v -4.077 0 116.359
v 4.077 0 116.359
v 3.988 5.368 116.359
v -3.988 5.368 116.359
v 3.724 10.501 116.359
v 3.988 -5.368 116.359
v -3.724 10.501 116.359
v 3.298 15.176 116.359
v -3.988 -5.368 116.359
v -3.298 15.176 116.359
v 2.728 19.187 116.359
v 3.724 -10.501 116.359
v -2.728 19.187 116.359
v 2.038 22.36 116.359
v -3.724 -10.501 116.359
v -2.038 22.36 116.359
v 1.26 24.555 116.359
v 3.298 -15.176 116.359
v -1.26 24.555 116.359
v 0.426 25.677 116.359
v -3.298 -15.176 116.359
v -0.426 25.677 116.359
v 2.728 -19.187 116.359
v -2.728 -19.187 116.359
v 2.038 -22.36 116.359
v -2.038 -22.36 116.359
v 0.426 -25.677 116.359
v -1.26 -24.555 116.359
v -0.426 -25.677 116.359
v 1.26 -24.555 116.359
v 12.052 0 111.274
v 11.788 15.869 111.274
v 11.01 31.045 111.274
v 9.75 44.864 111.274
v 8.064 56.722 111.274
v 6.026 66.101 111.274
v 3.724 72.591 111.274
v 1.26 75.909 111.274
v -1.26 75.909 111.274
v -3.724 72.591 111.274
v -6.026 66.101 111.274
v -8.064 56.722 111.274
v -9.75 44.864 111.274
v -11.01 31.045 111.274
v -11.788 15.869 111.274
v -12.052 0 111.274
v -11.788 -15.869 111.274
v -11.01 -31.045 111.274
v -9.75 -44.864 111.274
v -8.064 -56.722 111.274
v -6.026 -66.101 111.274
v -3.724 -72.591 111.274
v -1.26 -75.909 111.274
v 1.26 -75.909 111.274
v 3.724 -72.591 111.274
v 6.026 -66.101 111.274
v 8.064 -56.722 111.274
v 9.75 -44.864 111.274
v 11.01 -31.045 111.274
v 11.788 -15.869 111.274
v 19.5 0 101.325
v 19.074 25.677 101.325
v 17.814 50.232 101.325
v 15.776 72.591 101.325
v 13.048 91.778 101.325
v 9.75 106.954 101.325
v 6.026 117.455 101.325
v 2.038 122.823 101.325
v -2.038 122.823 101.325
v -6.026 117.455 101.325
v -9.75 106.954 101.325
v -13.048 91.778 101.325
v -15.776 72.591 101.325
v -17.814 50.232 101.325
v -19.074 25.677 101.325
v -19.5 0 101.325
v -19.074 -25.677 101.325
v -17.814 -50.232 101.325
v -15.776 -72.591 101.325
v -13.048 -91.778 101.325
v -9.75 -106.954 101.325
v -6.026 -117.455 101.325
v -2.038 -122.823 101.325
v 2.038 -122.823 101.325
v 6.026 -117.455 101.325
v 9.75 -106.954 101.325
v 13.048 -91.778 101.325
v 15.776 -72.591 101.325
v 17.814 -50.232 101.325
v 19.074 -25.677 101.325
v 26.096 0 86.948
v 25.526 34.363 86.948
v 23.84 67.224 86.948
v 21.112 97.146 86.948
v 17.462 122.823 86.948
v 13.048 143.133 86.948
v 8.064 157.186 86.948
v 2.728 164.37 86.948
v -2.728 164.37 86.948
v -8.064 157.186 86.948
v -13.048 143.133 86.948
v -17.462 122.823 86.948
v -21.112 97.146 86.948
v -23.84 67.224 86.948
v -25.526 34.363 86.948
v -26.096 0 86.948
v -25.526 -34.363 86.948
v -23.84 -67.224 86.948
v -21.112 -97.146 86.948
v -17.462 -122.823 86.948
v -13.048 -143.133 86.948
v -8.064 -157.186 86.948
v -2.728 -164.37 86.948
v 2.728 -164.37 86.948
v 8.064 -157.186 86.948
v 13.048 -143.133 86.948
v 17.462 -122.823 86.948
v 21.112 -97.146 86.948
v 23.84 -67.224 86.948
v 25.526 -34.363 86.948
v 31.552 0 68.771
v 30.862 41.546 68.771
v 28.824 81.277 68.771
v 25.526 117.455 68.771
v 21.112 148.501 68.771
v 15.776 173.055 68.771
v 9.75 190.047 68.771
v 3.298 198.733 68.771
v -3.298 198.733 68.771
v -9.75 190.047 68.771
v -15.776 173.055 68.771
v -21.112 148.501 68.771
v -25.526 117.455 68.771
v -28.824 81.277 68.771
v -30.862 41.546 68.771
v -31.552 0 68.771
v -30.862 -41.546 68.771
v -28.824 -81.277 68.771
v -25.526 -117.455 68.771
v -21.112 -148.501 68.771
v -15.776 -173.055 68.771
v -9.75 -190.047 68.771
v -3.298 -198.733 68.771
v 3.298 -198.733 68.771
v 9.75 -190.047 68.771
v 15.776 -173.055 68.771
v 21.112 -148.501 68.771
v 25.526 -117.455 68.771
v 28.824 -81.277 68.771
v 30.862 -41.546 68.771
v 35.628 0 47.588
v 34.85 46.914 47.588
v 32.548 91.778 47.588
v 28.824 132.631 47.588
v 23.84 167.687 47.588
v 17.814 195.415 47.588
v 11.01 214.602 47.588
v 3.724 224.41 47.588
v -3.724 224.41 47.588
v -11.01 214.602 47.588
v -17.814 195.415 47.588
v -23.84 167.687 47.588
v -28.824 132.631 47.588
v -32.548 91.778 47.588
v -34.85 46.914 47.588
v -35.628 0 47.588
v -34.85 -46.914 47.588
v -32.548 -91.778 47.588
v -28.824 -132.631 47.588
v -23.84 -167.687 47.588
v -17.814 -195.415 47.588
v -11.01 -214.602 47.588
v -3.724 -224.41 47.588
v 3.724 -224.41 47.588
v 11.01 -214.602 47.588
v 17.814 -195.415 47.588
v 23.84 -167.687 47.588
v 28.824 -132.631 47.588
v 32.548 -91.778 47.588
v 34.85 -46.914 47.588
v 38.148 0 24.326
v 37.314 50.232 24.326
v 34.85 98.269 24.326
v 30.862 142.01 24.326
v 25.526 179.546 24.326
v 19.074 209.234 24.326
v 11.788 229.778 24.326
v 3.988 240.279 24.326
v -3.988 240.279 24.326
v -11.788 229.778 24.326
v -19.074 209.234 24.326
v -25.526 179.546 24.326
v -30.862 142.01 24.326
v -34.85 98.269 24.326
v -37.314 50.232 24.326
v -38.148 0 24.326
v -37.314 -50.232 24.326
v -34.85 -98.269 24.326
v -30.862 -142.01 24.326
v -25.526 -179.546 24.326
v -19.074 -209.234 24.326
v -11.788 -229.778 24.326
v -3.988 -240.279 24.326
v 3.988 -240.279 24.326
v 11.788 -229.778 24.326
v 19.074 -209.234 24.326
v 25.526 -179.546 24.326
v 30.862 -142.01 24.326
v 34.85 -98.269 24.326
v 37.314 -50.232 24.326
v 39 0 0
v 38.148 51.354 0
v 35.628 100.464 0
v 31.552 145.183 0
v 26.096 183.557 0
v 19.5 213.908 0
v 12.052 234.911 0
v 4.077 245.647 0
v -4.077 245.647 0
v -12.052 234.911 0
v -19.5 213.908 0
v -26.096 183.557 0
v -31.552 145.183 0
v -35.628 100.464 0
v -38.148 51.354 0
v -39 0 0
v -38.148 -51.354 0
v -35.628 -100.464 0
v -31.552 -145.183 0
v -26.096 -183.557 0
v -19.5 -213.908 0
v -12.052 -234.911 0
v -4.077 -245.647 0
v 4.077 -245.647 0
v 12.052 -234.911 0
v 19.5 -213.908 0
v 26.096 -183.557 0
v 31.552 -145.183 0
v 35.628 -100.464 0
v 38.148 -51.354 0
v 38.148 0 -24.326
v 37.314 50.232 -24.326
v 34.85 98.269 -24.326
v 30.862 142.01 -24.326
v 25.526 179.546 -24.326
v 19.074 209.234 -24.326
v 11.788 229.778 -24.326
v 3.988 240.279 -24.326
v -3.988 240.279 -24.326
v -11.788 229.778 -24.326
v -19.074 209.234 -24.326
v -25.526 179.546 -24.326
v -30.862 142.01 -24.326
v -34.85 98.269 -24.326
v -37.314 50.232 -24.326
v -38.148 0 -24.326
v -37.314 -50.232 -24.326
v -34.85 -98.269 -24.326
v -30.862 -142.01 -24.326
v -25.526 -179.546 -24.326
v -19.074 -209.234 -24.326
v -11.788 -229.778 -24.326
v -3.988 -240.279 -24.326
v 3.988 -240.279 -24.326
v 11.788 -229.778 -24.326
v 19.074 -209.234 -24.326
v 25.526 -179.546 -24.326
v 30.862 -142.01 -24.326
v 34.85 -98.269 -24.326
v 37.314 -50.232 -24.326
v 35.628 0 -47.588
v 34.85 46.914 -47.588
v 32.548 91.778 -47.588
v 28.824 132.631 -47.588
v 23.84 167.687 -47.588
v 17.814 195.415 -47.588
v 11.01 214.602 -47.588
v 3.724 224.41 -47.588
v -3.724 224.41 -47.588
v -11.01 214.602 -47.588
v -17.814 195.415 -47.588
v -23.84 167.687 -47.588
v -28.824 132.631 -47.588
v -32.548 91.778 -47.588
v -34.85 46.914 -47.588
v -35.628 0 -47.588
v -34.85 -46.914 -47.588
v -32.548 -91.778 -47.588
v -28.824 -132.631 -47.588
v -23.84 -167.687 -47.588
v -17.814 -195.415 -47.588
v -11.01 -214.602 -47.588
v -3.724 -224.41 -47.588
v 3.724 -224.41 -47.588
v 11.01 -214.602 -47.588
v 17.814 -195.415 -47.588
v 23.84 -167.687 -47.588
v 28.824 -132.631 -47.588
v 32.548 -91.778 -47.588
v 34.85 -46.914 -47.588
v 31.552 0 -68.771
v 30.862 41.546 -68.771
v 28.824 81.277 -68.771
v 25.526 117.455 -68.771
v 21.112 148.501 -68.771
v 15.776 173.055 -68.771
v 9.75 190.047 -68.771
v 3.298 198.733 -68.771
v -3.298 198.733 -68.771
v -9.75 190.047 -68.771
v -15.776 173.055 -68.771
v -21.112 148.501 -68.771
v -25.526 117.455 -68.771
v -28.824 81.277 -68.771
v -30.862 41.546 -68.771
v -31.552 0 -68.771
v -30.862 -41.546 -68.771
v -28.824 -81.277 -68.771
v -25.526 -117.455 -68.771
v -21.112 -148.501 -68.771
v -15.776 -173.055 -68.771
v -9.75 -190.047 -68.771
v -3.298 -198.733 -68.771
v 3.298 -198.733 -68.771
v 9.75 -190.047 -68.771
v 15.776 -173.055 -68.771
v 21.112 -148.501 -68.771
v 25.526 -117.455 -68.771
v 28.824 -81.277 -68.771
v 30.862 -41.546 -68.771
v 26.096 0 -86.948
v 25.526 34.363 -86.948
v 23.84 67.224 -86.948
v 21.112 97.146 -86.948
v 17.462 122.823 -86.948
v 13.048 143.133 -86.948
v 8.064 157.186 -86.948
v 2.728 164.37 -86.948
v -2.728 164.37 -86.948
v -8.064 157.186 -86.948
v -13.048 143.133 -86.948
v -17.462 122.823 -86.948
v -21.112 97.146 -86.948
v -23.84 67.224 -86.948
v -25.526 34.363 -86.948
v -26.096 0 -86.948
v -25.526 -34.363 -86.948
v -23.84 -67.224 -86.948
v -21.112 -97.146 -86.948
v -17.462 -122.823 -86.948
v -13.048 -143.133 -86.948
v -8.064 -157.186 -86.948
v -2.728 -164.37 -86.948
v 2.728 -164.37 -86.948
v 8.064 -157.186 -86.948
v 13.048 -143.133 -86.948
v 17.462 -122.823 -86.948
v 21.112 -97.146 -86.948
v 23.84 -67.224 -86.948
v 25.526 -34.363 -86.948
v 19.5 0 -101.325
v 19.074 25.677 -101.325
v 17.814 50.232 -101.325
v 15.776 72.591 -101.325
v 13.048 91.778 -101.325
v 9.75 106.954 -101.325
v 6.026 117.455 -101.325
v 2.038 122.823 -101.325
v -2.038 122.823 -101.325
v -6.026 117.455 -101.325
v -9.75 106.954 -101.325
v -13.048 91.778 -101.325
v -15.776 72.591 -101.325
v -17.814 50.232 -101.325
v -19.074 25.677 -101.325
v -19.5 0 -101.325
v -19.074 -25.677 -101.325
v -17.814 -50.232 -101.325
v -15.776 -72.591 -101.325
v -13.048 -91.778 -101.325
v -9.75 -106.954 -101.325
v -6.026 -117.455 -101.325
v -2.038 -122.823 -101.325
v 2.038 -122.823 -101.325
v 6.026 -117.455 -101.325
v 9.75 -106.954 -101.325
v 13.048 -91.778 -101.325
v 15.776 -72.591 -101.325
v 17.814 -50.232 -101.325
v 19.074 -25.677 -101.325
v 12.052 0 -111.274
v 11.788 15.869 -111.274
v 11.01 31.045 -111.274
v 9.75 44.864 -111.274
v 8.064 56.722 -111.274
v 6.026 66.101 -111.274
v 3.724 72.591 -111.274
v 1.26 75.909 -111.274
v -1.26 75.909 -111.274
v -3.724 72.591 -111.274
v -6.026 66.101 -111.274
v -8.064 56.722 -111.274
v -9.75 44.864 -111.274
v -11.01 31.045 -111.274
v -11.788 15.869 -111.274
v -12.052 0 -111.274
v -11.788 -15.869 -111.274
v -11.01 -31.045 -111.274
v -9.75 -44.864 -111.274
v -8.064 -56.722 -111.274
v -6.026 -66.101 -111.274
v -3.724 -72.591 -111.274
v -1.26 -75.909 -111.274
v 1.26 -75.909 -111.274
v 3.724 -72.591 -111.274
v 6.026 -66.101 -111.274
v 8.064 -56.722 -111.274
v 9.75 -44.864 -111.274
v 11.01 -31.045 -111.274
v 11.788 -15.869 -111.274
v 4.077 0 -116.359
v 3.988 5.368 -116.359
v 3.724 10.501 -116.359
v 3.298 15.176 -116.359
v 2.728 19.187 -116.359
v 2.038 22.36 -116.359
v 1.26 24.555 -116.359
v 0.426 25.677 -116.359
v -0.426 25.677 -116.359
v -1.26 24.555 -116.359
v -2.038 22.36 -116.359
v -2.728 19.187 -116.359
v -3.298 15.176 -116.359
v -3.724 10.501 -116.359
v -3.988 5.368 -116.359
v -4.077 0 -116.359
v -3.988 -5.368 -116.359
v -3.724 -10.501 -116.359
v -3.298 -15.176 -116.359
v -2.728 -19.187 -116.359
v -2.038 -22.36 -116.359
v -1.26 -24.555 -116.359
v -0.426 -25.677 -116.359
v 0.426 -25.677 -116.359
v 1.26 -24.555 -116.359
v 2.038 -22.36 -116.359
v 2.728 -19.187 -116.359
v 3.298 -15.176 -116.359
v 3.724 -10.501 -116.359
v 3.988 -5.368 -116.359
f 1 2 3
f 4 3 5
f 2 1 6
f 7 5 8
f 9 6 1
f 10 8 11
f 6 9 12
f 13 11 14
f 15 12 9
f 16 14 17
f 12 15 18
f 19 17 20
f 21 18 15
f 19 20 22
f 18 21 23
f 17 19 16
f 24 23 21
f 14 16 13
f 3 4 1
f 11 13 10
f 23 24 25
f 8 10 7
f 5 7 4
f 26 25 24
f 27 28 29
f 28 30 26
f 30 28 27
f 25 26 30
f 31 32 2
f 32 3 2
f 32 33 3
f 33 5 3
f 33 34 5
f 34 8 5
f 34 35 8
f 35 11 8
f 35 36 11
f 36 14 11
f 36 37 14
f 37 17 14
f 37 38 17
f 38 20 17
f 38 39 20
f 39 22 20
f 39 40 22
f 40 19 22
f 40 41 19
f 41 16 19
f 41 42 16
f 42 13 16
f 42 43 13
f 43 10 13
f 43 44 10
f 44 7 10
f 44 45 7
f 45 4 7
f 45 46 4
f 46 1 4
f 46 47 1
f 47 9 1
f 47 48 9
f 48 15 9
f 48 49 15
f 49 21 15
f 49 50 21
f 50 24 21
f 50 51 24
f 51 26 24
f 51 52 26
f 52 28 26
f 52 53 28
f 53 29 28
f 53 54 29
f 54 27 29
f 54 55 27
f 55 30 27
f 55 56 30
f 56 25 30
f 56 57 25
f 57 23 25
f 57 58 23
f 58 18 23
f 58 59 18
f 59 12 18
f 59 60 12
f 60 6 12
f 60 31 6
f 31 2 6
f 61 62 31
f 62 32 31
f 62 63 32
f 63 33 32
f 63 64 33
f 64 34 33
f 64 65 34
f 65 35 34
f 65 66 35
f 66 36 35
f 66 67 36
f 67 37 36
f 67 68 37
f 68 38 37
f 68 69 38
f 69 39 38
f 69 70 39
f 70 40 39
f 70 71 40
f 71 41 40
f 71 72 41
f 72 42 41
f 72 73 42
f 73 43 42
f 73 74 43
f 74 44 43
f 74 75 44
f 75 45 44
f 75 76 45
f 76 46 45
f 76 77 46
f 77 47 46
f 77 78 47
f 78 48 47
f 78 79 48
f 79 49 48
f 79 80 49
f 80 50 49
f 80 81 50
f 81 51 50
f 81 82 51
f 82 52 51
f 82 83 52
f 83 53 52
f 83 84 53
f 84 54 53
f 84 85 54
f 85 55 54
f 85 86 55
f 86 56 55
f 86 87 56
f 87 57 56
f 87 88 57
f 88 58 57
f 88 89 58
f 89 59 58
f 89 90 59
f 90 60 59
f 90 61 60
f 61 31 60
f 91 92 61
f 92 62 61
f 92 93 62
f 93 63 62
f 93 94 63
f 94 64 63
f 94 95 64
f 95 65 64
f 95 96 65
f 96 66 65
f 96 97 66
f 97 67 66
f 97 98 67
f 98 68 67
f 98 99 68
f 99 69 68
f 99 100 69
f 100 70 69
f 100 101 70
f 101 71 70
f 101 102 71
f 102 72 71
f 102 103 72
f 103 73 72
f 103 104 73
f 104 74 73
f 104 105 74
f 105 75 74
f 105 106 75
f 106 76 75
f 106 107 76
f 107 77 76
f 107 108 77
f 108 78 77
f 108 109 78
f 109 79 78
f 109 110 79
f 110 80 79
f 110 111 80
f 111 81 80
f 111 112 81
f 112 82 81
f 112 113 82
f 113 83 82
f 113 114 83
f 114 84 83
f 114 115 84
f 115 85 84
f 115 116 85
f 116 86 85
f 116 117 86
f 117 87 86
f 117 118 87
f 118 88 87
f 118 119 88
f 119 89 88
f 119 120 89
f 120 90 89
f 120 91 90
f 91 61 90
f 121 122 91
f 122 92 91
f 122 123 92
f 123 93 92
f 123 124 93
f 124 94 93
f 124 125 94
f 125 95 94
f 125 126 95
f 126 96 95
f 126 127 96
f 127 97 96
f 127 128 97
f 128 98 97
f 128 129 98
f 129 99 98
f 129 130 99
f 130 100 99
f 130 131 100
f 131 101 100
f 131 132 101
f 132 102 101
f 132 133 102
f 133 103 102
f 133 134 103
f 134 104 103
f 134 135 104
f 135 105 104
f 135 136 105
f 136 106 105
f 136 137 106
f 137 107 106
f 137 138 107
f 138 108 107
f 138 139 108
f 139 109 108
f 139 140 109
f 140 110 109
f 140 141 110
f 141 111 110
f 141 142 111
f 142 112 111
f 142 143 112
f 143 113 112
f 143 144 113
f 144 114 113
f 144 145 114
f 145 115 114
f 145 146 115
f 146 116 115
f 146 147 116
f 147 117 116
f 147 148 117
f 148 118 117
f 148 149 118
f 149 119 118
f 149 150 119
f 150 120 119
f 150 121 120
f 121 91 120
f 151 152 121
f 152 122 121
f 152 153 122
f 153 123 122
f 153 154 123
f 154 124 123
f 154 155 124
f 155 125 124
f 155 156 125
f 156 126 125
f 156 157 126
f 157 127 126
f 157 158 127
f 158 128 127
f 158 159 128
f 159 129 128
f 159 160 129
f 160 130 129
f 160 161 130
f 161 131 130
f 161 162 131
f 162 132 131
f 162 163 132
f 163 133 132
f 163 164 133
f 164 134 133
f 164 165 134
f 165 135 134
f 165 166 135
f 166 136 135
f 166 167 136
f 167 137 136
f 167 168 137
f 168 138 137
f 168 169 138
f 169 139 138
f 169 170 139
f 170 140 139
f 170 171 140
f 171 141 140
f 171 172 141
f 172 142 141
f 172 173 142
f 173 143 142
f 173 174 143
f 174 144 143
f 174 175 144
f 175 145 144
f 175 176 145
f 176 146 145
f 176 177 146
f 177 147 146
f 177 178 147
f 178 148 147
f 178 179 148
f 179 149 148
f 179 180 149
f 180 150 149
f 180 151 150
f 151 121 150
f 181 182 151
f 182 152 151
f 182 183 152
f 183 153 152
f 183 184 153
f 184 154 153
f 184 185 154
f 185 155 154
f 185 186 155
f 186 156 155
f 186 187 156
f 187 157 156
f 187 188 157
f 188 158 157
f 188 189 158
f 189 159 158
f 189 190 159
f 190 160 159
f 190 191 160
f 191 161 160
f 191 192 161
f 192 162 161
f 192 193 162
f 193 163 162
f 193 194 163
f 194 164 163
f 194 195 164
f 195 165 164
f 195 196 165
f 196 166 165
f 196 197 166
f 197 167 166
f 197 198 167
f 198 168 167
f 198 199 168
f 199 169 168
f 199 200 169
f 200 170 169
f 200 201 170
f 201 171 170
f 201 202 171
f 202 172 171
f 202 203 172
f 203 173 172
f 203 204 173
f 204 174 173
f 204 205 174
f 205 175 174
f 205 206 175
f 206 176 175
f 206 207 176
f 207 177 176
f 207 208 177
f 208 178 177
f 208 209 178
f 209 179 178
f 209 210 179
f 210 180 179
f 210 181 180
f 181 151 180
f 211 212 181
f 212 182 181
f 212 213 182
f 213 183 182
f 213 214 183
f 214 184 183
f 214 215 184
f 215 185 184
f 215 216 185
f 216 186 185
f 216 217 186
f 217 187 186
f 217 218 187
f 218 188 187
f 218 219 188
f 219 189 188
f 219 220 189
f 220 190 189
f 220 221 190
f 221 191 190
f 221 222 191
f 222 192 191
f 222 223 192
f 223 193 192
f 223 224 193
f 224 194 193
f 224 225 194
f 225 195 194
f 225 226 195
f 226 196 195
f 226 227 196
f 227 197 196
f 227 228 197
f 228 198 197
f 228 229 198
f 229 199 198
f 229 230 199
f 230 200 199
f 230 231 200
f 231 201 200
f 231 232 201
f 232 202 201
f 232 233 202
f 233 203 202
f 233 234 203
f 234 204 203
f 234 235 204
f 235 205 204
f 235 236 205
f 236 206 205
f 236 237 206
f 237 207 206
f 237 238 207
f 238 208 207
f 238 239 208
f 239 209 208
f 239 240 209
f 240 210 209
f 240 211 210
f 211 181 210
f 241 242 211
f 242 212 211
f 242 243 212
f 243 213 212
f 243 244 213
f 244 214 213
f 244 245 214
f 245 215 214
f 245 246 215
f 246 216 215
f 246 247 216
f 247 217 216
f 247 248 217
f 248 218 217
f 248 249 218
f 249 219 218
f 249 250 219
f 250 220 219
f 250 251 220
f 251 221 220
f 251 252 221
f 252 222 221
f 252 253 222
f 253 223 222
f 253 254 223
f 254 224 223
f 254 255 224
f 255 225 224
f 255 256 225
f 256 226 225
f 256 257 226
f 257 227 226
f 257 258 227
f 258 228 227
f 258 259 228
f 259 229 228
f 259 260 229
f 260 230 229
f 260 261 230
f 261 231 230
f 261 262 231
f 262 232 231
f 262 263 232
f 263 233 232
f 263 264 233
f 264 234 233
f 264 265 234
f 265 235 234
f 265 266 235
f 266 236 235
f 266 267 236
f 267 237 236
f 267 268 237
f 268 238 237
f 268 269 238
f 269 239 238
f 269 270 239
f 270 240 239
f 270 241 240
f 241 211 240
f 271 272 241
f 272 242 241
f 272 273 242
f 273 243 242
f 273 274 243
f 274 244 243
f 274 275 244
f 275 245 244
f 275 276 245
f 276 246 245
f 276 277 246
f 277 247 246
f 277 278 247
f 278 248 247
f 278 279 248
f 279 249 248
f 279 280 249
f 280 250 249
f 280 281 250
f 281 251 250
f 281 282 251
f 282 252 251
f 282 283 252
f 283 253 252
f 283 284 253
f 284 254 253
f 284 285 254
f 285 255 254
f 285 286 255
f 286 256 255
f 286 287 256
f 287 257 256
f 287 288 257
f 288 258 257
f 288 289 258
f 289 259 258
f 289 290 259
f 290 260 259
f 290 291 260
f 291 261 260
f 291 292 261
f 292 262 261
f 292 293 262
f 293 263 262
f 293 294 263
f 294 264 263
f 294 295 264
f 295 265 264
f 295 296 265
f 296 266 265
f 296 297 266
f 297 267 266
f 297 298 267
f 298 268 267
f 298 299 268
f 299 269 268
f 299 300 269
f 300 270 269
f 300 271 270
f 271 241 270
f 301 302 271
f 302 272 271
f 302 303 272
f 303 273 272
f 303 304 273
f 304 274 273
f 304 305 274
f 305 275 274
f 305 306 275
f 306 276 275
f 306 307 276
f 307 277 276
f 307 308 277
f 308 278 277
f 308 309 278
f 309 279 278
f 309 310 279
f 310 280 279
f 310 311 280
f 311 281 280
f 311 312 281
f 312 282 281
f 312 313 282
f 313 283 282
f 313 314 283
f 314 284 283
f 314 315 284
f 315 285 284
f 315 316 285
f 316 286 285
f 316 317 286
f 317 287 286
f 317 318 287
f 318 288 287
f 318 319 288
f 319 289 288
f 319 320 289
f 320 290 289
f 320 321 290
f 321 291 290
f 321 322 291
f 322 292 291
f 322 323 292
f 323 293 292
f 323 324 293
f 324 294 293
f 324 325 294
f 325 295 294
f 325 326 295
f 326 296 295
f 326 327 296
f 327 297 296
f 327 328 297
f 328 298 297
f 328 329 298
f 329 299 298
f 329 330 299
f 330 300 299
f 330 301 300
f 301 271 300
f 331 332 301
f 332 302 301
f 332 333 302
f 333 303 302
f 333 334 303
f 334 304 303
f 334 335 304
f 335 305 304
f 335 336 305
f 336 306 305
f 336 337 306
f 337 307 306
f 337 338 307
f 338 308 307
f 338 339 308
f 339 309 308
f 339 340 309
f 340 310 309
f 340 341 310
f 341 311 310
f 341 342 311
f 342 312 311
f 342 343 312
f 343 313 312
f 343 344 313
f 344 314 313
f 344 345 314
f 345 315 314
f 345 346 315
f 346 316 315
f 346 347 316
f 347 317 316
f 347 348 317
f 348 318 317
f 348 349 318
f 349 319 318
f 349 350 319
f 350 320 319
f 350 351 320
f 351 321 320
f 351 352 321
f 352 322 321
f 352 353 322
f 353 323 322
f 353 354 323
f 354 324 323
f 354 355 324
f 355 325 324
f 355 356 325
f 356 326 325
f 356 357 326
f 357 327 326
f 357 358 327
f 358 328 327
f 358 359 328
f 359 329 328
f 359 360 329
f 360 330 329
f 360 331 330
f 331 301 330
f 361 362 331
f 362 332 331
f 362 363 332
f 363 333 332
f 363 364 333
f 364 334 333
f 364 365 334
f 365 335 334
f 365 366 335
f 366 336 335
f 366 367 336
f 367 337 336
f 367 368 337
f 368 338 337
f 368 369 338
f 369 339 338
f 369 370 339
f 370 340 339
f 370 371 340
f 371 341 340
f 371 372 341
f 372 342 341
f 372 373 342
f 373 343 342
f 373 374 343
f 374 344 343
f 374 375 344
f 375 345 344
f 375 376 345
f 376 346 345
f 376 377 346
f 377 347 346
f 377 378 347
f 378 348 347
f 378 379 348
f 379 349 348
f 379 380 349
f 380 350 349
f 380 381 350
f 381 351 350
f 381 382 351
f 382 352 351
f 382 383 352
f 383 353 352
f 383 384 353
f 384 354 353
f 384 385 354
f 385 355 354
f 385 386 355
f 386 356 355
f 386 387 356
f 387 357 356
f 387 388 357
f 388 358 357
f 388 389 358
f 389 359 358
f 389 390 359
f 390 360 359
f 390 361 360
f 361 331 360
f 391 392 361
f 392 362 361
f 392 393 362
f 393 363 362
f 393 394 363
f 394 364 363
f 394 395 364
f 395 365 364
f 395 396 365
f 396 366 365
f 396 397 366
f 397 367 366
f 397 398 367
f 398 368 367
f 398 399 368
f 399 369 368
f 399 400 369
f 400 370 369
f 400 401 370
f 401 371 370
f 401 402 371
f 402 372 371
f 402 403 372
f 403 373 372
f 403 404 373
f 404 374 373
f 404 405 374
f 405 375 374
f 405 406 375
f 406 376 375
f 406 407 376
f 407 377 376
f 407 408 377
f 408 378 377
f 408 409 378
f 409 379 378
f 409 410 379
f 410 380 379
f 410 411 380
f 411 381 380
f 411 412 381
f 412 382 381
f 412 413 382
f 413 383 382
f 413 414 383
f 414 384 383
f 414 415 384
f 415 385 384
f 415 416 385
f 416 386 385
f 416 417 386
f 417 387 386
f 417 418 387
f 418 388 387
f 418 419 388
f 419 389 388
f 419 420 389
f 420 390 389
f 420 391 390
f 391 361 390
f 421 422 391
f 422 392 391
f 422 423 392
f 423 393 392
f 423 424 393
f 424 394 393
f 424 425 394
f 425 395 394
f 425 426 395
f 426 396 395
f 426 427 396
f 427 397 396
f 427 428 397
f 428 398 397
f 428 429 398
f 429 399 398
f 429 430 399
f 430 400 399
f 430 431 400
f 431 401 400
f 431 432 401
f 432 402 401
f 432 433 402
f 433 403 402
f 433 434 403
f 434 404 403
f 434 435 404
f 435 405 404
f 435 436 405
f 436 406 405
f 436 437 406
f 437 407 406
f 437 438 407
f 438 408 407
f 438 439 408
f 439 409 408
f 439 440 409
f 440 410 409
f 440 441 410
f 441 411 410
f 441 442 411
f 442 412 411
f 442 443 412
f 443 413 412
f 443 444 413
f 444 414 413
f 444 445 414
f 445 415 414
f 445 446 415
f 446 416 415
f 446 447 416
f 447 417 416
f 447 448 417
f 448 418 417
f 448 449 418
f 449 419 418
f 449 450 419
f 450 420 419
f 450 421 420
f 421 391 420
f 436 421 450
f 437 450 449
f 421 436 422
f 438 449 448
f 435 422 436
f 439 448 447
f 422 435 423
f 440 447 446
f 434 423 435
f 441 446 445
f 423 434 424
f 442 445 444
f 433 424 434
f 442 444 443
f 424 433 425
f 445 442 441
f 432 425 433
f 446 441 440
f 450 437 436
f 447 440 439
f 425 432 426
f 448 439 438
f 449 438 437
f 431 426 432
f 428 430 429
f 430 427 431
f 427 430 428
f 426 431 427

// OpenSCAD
// Generated by SolidPython 1.0.1 on 2020-07-29 00:46:46


scale(v = [3, 19, 9]) {
	sphere(r = 13);
}
/***********************************************
*********      SolidPython code:      **********
************************************************
 
# import packages: SolidPython
from solid import *
from solid.utils import *
from itertools import chain, combinations, permutations


class Resize:

    def __init__(self, scad_file):
        self.scad_file = scad_file
        #self.scad_file = import_scad(scad_file)
        # cone/cylinder param:
        self.r1 = 0
        self.r2 = 0
        self.h = 0
        # rectangular prism param:
        self.w = 0
        self.l = 0
        # ellipse param:
        self.r = 0

    # import OpenScad code (file name corresponds to shape)


    # classify shape + parameters
    def assign(self, param1, param2, param3):
        if self.scad_file == 'cone.scad':
            self.r1 = param1
            self.r2 = param2
            self.h = param3
        elif self.scad_file == 'cylinder.scad':
            self.r1 = param1
            self.r2 = param2
            self.h = param3
        elif self.scad_file == 'rectangularPrism.scad':
            self.h = param1
            self.l = param2
            self.w = param3
        else:
            self.r = param1
            self.h = param2

    # resize parameters
    def iterate(self):
        x = range(3, 20, 2)
        i = 1
        if self.scad_file == 'cone.scad':
            tempList = list(permutations(x, 2))
            for temp in tempList:
                param1 = temp[0]
                param2 = temp[1]
                filepath = 'produced_scad_files/' + 'cone' + str(param1) + '_' + str(param2) + '_' + '.scad'
                scad_render_to_file(cylinder(h=param1, r1=param2, r2=0), filepath)

        elif self.scad_file == 'cylinder.scad':
            tempList = list(permutations(x, 3))
            for temp in tempList:
                param1 = temp[0]
                param2 = temp[1]
                filepath = 'produced_scad_files/' + 'cylinder' + str(param1) + '_' + str(param2) + '_' + '.scad'
                scad_render_to_file(cylinder(h=param1, r1=param2, r2=param2), filepath)

        elif self.scad_file == 'rectangularPrism.scad':
            tempList = list(permutations(x, 3))
            for temp in tempList:
                param1 = temp[0]
                param2 = temp[1]
                param3 = temp[2]
                filepath = 'produced_scad_files/' + 'rectangularPrism' + str(param1) + '_' + str(param2) + '_' + str(
                    param3) + '.scad'
                scad_render_to_file(cube(size=(param1, param2, param3)), filepath)

        elif self.scad_file == 'ellipse.scad':
            tempList = list(permutations(x, 4))
            for temp in tempList:
                param1 = temp[0]
                param2 = temp[1]
                param3 = temp[2]
                param4 = temp[3]
                filepath = 'produced_scad_files/' + 'ellipse' + str(param1) + '_' + str(param2) + '_' + str(param3) + '_' + str(param4) + '.scad'
                scad_render_to_file(scale([param1, param2, param3])(sphere(r=param4)), filepath)

    def render_to_scadfile(self):
        scad_render_to_file(scad, 'example.scad') 
 
************************************************/
